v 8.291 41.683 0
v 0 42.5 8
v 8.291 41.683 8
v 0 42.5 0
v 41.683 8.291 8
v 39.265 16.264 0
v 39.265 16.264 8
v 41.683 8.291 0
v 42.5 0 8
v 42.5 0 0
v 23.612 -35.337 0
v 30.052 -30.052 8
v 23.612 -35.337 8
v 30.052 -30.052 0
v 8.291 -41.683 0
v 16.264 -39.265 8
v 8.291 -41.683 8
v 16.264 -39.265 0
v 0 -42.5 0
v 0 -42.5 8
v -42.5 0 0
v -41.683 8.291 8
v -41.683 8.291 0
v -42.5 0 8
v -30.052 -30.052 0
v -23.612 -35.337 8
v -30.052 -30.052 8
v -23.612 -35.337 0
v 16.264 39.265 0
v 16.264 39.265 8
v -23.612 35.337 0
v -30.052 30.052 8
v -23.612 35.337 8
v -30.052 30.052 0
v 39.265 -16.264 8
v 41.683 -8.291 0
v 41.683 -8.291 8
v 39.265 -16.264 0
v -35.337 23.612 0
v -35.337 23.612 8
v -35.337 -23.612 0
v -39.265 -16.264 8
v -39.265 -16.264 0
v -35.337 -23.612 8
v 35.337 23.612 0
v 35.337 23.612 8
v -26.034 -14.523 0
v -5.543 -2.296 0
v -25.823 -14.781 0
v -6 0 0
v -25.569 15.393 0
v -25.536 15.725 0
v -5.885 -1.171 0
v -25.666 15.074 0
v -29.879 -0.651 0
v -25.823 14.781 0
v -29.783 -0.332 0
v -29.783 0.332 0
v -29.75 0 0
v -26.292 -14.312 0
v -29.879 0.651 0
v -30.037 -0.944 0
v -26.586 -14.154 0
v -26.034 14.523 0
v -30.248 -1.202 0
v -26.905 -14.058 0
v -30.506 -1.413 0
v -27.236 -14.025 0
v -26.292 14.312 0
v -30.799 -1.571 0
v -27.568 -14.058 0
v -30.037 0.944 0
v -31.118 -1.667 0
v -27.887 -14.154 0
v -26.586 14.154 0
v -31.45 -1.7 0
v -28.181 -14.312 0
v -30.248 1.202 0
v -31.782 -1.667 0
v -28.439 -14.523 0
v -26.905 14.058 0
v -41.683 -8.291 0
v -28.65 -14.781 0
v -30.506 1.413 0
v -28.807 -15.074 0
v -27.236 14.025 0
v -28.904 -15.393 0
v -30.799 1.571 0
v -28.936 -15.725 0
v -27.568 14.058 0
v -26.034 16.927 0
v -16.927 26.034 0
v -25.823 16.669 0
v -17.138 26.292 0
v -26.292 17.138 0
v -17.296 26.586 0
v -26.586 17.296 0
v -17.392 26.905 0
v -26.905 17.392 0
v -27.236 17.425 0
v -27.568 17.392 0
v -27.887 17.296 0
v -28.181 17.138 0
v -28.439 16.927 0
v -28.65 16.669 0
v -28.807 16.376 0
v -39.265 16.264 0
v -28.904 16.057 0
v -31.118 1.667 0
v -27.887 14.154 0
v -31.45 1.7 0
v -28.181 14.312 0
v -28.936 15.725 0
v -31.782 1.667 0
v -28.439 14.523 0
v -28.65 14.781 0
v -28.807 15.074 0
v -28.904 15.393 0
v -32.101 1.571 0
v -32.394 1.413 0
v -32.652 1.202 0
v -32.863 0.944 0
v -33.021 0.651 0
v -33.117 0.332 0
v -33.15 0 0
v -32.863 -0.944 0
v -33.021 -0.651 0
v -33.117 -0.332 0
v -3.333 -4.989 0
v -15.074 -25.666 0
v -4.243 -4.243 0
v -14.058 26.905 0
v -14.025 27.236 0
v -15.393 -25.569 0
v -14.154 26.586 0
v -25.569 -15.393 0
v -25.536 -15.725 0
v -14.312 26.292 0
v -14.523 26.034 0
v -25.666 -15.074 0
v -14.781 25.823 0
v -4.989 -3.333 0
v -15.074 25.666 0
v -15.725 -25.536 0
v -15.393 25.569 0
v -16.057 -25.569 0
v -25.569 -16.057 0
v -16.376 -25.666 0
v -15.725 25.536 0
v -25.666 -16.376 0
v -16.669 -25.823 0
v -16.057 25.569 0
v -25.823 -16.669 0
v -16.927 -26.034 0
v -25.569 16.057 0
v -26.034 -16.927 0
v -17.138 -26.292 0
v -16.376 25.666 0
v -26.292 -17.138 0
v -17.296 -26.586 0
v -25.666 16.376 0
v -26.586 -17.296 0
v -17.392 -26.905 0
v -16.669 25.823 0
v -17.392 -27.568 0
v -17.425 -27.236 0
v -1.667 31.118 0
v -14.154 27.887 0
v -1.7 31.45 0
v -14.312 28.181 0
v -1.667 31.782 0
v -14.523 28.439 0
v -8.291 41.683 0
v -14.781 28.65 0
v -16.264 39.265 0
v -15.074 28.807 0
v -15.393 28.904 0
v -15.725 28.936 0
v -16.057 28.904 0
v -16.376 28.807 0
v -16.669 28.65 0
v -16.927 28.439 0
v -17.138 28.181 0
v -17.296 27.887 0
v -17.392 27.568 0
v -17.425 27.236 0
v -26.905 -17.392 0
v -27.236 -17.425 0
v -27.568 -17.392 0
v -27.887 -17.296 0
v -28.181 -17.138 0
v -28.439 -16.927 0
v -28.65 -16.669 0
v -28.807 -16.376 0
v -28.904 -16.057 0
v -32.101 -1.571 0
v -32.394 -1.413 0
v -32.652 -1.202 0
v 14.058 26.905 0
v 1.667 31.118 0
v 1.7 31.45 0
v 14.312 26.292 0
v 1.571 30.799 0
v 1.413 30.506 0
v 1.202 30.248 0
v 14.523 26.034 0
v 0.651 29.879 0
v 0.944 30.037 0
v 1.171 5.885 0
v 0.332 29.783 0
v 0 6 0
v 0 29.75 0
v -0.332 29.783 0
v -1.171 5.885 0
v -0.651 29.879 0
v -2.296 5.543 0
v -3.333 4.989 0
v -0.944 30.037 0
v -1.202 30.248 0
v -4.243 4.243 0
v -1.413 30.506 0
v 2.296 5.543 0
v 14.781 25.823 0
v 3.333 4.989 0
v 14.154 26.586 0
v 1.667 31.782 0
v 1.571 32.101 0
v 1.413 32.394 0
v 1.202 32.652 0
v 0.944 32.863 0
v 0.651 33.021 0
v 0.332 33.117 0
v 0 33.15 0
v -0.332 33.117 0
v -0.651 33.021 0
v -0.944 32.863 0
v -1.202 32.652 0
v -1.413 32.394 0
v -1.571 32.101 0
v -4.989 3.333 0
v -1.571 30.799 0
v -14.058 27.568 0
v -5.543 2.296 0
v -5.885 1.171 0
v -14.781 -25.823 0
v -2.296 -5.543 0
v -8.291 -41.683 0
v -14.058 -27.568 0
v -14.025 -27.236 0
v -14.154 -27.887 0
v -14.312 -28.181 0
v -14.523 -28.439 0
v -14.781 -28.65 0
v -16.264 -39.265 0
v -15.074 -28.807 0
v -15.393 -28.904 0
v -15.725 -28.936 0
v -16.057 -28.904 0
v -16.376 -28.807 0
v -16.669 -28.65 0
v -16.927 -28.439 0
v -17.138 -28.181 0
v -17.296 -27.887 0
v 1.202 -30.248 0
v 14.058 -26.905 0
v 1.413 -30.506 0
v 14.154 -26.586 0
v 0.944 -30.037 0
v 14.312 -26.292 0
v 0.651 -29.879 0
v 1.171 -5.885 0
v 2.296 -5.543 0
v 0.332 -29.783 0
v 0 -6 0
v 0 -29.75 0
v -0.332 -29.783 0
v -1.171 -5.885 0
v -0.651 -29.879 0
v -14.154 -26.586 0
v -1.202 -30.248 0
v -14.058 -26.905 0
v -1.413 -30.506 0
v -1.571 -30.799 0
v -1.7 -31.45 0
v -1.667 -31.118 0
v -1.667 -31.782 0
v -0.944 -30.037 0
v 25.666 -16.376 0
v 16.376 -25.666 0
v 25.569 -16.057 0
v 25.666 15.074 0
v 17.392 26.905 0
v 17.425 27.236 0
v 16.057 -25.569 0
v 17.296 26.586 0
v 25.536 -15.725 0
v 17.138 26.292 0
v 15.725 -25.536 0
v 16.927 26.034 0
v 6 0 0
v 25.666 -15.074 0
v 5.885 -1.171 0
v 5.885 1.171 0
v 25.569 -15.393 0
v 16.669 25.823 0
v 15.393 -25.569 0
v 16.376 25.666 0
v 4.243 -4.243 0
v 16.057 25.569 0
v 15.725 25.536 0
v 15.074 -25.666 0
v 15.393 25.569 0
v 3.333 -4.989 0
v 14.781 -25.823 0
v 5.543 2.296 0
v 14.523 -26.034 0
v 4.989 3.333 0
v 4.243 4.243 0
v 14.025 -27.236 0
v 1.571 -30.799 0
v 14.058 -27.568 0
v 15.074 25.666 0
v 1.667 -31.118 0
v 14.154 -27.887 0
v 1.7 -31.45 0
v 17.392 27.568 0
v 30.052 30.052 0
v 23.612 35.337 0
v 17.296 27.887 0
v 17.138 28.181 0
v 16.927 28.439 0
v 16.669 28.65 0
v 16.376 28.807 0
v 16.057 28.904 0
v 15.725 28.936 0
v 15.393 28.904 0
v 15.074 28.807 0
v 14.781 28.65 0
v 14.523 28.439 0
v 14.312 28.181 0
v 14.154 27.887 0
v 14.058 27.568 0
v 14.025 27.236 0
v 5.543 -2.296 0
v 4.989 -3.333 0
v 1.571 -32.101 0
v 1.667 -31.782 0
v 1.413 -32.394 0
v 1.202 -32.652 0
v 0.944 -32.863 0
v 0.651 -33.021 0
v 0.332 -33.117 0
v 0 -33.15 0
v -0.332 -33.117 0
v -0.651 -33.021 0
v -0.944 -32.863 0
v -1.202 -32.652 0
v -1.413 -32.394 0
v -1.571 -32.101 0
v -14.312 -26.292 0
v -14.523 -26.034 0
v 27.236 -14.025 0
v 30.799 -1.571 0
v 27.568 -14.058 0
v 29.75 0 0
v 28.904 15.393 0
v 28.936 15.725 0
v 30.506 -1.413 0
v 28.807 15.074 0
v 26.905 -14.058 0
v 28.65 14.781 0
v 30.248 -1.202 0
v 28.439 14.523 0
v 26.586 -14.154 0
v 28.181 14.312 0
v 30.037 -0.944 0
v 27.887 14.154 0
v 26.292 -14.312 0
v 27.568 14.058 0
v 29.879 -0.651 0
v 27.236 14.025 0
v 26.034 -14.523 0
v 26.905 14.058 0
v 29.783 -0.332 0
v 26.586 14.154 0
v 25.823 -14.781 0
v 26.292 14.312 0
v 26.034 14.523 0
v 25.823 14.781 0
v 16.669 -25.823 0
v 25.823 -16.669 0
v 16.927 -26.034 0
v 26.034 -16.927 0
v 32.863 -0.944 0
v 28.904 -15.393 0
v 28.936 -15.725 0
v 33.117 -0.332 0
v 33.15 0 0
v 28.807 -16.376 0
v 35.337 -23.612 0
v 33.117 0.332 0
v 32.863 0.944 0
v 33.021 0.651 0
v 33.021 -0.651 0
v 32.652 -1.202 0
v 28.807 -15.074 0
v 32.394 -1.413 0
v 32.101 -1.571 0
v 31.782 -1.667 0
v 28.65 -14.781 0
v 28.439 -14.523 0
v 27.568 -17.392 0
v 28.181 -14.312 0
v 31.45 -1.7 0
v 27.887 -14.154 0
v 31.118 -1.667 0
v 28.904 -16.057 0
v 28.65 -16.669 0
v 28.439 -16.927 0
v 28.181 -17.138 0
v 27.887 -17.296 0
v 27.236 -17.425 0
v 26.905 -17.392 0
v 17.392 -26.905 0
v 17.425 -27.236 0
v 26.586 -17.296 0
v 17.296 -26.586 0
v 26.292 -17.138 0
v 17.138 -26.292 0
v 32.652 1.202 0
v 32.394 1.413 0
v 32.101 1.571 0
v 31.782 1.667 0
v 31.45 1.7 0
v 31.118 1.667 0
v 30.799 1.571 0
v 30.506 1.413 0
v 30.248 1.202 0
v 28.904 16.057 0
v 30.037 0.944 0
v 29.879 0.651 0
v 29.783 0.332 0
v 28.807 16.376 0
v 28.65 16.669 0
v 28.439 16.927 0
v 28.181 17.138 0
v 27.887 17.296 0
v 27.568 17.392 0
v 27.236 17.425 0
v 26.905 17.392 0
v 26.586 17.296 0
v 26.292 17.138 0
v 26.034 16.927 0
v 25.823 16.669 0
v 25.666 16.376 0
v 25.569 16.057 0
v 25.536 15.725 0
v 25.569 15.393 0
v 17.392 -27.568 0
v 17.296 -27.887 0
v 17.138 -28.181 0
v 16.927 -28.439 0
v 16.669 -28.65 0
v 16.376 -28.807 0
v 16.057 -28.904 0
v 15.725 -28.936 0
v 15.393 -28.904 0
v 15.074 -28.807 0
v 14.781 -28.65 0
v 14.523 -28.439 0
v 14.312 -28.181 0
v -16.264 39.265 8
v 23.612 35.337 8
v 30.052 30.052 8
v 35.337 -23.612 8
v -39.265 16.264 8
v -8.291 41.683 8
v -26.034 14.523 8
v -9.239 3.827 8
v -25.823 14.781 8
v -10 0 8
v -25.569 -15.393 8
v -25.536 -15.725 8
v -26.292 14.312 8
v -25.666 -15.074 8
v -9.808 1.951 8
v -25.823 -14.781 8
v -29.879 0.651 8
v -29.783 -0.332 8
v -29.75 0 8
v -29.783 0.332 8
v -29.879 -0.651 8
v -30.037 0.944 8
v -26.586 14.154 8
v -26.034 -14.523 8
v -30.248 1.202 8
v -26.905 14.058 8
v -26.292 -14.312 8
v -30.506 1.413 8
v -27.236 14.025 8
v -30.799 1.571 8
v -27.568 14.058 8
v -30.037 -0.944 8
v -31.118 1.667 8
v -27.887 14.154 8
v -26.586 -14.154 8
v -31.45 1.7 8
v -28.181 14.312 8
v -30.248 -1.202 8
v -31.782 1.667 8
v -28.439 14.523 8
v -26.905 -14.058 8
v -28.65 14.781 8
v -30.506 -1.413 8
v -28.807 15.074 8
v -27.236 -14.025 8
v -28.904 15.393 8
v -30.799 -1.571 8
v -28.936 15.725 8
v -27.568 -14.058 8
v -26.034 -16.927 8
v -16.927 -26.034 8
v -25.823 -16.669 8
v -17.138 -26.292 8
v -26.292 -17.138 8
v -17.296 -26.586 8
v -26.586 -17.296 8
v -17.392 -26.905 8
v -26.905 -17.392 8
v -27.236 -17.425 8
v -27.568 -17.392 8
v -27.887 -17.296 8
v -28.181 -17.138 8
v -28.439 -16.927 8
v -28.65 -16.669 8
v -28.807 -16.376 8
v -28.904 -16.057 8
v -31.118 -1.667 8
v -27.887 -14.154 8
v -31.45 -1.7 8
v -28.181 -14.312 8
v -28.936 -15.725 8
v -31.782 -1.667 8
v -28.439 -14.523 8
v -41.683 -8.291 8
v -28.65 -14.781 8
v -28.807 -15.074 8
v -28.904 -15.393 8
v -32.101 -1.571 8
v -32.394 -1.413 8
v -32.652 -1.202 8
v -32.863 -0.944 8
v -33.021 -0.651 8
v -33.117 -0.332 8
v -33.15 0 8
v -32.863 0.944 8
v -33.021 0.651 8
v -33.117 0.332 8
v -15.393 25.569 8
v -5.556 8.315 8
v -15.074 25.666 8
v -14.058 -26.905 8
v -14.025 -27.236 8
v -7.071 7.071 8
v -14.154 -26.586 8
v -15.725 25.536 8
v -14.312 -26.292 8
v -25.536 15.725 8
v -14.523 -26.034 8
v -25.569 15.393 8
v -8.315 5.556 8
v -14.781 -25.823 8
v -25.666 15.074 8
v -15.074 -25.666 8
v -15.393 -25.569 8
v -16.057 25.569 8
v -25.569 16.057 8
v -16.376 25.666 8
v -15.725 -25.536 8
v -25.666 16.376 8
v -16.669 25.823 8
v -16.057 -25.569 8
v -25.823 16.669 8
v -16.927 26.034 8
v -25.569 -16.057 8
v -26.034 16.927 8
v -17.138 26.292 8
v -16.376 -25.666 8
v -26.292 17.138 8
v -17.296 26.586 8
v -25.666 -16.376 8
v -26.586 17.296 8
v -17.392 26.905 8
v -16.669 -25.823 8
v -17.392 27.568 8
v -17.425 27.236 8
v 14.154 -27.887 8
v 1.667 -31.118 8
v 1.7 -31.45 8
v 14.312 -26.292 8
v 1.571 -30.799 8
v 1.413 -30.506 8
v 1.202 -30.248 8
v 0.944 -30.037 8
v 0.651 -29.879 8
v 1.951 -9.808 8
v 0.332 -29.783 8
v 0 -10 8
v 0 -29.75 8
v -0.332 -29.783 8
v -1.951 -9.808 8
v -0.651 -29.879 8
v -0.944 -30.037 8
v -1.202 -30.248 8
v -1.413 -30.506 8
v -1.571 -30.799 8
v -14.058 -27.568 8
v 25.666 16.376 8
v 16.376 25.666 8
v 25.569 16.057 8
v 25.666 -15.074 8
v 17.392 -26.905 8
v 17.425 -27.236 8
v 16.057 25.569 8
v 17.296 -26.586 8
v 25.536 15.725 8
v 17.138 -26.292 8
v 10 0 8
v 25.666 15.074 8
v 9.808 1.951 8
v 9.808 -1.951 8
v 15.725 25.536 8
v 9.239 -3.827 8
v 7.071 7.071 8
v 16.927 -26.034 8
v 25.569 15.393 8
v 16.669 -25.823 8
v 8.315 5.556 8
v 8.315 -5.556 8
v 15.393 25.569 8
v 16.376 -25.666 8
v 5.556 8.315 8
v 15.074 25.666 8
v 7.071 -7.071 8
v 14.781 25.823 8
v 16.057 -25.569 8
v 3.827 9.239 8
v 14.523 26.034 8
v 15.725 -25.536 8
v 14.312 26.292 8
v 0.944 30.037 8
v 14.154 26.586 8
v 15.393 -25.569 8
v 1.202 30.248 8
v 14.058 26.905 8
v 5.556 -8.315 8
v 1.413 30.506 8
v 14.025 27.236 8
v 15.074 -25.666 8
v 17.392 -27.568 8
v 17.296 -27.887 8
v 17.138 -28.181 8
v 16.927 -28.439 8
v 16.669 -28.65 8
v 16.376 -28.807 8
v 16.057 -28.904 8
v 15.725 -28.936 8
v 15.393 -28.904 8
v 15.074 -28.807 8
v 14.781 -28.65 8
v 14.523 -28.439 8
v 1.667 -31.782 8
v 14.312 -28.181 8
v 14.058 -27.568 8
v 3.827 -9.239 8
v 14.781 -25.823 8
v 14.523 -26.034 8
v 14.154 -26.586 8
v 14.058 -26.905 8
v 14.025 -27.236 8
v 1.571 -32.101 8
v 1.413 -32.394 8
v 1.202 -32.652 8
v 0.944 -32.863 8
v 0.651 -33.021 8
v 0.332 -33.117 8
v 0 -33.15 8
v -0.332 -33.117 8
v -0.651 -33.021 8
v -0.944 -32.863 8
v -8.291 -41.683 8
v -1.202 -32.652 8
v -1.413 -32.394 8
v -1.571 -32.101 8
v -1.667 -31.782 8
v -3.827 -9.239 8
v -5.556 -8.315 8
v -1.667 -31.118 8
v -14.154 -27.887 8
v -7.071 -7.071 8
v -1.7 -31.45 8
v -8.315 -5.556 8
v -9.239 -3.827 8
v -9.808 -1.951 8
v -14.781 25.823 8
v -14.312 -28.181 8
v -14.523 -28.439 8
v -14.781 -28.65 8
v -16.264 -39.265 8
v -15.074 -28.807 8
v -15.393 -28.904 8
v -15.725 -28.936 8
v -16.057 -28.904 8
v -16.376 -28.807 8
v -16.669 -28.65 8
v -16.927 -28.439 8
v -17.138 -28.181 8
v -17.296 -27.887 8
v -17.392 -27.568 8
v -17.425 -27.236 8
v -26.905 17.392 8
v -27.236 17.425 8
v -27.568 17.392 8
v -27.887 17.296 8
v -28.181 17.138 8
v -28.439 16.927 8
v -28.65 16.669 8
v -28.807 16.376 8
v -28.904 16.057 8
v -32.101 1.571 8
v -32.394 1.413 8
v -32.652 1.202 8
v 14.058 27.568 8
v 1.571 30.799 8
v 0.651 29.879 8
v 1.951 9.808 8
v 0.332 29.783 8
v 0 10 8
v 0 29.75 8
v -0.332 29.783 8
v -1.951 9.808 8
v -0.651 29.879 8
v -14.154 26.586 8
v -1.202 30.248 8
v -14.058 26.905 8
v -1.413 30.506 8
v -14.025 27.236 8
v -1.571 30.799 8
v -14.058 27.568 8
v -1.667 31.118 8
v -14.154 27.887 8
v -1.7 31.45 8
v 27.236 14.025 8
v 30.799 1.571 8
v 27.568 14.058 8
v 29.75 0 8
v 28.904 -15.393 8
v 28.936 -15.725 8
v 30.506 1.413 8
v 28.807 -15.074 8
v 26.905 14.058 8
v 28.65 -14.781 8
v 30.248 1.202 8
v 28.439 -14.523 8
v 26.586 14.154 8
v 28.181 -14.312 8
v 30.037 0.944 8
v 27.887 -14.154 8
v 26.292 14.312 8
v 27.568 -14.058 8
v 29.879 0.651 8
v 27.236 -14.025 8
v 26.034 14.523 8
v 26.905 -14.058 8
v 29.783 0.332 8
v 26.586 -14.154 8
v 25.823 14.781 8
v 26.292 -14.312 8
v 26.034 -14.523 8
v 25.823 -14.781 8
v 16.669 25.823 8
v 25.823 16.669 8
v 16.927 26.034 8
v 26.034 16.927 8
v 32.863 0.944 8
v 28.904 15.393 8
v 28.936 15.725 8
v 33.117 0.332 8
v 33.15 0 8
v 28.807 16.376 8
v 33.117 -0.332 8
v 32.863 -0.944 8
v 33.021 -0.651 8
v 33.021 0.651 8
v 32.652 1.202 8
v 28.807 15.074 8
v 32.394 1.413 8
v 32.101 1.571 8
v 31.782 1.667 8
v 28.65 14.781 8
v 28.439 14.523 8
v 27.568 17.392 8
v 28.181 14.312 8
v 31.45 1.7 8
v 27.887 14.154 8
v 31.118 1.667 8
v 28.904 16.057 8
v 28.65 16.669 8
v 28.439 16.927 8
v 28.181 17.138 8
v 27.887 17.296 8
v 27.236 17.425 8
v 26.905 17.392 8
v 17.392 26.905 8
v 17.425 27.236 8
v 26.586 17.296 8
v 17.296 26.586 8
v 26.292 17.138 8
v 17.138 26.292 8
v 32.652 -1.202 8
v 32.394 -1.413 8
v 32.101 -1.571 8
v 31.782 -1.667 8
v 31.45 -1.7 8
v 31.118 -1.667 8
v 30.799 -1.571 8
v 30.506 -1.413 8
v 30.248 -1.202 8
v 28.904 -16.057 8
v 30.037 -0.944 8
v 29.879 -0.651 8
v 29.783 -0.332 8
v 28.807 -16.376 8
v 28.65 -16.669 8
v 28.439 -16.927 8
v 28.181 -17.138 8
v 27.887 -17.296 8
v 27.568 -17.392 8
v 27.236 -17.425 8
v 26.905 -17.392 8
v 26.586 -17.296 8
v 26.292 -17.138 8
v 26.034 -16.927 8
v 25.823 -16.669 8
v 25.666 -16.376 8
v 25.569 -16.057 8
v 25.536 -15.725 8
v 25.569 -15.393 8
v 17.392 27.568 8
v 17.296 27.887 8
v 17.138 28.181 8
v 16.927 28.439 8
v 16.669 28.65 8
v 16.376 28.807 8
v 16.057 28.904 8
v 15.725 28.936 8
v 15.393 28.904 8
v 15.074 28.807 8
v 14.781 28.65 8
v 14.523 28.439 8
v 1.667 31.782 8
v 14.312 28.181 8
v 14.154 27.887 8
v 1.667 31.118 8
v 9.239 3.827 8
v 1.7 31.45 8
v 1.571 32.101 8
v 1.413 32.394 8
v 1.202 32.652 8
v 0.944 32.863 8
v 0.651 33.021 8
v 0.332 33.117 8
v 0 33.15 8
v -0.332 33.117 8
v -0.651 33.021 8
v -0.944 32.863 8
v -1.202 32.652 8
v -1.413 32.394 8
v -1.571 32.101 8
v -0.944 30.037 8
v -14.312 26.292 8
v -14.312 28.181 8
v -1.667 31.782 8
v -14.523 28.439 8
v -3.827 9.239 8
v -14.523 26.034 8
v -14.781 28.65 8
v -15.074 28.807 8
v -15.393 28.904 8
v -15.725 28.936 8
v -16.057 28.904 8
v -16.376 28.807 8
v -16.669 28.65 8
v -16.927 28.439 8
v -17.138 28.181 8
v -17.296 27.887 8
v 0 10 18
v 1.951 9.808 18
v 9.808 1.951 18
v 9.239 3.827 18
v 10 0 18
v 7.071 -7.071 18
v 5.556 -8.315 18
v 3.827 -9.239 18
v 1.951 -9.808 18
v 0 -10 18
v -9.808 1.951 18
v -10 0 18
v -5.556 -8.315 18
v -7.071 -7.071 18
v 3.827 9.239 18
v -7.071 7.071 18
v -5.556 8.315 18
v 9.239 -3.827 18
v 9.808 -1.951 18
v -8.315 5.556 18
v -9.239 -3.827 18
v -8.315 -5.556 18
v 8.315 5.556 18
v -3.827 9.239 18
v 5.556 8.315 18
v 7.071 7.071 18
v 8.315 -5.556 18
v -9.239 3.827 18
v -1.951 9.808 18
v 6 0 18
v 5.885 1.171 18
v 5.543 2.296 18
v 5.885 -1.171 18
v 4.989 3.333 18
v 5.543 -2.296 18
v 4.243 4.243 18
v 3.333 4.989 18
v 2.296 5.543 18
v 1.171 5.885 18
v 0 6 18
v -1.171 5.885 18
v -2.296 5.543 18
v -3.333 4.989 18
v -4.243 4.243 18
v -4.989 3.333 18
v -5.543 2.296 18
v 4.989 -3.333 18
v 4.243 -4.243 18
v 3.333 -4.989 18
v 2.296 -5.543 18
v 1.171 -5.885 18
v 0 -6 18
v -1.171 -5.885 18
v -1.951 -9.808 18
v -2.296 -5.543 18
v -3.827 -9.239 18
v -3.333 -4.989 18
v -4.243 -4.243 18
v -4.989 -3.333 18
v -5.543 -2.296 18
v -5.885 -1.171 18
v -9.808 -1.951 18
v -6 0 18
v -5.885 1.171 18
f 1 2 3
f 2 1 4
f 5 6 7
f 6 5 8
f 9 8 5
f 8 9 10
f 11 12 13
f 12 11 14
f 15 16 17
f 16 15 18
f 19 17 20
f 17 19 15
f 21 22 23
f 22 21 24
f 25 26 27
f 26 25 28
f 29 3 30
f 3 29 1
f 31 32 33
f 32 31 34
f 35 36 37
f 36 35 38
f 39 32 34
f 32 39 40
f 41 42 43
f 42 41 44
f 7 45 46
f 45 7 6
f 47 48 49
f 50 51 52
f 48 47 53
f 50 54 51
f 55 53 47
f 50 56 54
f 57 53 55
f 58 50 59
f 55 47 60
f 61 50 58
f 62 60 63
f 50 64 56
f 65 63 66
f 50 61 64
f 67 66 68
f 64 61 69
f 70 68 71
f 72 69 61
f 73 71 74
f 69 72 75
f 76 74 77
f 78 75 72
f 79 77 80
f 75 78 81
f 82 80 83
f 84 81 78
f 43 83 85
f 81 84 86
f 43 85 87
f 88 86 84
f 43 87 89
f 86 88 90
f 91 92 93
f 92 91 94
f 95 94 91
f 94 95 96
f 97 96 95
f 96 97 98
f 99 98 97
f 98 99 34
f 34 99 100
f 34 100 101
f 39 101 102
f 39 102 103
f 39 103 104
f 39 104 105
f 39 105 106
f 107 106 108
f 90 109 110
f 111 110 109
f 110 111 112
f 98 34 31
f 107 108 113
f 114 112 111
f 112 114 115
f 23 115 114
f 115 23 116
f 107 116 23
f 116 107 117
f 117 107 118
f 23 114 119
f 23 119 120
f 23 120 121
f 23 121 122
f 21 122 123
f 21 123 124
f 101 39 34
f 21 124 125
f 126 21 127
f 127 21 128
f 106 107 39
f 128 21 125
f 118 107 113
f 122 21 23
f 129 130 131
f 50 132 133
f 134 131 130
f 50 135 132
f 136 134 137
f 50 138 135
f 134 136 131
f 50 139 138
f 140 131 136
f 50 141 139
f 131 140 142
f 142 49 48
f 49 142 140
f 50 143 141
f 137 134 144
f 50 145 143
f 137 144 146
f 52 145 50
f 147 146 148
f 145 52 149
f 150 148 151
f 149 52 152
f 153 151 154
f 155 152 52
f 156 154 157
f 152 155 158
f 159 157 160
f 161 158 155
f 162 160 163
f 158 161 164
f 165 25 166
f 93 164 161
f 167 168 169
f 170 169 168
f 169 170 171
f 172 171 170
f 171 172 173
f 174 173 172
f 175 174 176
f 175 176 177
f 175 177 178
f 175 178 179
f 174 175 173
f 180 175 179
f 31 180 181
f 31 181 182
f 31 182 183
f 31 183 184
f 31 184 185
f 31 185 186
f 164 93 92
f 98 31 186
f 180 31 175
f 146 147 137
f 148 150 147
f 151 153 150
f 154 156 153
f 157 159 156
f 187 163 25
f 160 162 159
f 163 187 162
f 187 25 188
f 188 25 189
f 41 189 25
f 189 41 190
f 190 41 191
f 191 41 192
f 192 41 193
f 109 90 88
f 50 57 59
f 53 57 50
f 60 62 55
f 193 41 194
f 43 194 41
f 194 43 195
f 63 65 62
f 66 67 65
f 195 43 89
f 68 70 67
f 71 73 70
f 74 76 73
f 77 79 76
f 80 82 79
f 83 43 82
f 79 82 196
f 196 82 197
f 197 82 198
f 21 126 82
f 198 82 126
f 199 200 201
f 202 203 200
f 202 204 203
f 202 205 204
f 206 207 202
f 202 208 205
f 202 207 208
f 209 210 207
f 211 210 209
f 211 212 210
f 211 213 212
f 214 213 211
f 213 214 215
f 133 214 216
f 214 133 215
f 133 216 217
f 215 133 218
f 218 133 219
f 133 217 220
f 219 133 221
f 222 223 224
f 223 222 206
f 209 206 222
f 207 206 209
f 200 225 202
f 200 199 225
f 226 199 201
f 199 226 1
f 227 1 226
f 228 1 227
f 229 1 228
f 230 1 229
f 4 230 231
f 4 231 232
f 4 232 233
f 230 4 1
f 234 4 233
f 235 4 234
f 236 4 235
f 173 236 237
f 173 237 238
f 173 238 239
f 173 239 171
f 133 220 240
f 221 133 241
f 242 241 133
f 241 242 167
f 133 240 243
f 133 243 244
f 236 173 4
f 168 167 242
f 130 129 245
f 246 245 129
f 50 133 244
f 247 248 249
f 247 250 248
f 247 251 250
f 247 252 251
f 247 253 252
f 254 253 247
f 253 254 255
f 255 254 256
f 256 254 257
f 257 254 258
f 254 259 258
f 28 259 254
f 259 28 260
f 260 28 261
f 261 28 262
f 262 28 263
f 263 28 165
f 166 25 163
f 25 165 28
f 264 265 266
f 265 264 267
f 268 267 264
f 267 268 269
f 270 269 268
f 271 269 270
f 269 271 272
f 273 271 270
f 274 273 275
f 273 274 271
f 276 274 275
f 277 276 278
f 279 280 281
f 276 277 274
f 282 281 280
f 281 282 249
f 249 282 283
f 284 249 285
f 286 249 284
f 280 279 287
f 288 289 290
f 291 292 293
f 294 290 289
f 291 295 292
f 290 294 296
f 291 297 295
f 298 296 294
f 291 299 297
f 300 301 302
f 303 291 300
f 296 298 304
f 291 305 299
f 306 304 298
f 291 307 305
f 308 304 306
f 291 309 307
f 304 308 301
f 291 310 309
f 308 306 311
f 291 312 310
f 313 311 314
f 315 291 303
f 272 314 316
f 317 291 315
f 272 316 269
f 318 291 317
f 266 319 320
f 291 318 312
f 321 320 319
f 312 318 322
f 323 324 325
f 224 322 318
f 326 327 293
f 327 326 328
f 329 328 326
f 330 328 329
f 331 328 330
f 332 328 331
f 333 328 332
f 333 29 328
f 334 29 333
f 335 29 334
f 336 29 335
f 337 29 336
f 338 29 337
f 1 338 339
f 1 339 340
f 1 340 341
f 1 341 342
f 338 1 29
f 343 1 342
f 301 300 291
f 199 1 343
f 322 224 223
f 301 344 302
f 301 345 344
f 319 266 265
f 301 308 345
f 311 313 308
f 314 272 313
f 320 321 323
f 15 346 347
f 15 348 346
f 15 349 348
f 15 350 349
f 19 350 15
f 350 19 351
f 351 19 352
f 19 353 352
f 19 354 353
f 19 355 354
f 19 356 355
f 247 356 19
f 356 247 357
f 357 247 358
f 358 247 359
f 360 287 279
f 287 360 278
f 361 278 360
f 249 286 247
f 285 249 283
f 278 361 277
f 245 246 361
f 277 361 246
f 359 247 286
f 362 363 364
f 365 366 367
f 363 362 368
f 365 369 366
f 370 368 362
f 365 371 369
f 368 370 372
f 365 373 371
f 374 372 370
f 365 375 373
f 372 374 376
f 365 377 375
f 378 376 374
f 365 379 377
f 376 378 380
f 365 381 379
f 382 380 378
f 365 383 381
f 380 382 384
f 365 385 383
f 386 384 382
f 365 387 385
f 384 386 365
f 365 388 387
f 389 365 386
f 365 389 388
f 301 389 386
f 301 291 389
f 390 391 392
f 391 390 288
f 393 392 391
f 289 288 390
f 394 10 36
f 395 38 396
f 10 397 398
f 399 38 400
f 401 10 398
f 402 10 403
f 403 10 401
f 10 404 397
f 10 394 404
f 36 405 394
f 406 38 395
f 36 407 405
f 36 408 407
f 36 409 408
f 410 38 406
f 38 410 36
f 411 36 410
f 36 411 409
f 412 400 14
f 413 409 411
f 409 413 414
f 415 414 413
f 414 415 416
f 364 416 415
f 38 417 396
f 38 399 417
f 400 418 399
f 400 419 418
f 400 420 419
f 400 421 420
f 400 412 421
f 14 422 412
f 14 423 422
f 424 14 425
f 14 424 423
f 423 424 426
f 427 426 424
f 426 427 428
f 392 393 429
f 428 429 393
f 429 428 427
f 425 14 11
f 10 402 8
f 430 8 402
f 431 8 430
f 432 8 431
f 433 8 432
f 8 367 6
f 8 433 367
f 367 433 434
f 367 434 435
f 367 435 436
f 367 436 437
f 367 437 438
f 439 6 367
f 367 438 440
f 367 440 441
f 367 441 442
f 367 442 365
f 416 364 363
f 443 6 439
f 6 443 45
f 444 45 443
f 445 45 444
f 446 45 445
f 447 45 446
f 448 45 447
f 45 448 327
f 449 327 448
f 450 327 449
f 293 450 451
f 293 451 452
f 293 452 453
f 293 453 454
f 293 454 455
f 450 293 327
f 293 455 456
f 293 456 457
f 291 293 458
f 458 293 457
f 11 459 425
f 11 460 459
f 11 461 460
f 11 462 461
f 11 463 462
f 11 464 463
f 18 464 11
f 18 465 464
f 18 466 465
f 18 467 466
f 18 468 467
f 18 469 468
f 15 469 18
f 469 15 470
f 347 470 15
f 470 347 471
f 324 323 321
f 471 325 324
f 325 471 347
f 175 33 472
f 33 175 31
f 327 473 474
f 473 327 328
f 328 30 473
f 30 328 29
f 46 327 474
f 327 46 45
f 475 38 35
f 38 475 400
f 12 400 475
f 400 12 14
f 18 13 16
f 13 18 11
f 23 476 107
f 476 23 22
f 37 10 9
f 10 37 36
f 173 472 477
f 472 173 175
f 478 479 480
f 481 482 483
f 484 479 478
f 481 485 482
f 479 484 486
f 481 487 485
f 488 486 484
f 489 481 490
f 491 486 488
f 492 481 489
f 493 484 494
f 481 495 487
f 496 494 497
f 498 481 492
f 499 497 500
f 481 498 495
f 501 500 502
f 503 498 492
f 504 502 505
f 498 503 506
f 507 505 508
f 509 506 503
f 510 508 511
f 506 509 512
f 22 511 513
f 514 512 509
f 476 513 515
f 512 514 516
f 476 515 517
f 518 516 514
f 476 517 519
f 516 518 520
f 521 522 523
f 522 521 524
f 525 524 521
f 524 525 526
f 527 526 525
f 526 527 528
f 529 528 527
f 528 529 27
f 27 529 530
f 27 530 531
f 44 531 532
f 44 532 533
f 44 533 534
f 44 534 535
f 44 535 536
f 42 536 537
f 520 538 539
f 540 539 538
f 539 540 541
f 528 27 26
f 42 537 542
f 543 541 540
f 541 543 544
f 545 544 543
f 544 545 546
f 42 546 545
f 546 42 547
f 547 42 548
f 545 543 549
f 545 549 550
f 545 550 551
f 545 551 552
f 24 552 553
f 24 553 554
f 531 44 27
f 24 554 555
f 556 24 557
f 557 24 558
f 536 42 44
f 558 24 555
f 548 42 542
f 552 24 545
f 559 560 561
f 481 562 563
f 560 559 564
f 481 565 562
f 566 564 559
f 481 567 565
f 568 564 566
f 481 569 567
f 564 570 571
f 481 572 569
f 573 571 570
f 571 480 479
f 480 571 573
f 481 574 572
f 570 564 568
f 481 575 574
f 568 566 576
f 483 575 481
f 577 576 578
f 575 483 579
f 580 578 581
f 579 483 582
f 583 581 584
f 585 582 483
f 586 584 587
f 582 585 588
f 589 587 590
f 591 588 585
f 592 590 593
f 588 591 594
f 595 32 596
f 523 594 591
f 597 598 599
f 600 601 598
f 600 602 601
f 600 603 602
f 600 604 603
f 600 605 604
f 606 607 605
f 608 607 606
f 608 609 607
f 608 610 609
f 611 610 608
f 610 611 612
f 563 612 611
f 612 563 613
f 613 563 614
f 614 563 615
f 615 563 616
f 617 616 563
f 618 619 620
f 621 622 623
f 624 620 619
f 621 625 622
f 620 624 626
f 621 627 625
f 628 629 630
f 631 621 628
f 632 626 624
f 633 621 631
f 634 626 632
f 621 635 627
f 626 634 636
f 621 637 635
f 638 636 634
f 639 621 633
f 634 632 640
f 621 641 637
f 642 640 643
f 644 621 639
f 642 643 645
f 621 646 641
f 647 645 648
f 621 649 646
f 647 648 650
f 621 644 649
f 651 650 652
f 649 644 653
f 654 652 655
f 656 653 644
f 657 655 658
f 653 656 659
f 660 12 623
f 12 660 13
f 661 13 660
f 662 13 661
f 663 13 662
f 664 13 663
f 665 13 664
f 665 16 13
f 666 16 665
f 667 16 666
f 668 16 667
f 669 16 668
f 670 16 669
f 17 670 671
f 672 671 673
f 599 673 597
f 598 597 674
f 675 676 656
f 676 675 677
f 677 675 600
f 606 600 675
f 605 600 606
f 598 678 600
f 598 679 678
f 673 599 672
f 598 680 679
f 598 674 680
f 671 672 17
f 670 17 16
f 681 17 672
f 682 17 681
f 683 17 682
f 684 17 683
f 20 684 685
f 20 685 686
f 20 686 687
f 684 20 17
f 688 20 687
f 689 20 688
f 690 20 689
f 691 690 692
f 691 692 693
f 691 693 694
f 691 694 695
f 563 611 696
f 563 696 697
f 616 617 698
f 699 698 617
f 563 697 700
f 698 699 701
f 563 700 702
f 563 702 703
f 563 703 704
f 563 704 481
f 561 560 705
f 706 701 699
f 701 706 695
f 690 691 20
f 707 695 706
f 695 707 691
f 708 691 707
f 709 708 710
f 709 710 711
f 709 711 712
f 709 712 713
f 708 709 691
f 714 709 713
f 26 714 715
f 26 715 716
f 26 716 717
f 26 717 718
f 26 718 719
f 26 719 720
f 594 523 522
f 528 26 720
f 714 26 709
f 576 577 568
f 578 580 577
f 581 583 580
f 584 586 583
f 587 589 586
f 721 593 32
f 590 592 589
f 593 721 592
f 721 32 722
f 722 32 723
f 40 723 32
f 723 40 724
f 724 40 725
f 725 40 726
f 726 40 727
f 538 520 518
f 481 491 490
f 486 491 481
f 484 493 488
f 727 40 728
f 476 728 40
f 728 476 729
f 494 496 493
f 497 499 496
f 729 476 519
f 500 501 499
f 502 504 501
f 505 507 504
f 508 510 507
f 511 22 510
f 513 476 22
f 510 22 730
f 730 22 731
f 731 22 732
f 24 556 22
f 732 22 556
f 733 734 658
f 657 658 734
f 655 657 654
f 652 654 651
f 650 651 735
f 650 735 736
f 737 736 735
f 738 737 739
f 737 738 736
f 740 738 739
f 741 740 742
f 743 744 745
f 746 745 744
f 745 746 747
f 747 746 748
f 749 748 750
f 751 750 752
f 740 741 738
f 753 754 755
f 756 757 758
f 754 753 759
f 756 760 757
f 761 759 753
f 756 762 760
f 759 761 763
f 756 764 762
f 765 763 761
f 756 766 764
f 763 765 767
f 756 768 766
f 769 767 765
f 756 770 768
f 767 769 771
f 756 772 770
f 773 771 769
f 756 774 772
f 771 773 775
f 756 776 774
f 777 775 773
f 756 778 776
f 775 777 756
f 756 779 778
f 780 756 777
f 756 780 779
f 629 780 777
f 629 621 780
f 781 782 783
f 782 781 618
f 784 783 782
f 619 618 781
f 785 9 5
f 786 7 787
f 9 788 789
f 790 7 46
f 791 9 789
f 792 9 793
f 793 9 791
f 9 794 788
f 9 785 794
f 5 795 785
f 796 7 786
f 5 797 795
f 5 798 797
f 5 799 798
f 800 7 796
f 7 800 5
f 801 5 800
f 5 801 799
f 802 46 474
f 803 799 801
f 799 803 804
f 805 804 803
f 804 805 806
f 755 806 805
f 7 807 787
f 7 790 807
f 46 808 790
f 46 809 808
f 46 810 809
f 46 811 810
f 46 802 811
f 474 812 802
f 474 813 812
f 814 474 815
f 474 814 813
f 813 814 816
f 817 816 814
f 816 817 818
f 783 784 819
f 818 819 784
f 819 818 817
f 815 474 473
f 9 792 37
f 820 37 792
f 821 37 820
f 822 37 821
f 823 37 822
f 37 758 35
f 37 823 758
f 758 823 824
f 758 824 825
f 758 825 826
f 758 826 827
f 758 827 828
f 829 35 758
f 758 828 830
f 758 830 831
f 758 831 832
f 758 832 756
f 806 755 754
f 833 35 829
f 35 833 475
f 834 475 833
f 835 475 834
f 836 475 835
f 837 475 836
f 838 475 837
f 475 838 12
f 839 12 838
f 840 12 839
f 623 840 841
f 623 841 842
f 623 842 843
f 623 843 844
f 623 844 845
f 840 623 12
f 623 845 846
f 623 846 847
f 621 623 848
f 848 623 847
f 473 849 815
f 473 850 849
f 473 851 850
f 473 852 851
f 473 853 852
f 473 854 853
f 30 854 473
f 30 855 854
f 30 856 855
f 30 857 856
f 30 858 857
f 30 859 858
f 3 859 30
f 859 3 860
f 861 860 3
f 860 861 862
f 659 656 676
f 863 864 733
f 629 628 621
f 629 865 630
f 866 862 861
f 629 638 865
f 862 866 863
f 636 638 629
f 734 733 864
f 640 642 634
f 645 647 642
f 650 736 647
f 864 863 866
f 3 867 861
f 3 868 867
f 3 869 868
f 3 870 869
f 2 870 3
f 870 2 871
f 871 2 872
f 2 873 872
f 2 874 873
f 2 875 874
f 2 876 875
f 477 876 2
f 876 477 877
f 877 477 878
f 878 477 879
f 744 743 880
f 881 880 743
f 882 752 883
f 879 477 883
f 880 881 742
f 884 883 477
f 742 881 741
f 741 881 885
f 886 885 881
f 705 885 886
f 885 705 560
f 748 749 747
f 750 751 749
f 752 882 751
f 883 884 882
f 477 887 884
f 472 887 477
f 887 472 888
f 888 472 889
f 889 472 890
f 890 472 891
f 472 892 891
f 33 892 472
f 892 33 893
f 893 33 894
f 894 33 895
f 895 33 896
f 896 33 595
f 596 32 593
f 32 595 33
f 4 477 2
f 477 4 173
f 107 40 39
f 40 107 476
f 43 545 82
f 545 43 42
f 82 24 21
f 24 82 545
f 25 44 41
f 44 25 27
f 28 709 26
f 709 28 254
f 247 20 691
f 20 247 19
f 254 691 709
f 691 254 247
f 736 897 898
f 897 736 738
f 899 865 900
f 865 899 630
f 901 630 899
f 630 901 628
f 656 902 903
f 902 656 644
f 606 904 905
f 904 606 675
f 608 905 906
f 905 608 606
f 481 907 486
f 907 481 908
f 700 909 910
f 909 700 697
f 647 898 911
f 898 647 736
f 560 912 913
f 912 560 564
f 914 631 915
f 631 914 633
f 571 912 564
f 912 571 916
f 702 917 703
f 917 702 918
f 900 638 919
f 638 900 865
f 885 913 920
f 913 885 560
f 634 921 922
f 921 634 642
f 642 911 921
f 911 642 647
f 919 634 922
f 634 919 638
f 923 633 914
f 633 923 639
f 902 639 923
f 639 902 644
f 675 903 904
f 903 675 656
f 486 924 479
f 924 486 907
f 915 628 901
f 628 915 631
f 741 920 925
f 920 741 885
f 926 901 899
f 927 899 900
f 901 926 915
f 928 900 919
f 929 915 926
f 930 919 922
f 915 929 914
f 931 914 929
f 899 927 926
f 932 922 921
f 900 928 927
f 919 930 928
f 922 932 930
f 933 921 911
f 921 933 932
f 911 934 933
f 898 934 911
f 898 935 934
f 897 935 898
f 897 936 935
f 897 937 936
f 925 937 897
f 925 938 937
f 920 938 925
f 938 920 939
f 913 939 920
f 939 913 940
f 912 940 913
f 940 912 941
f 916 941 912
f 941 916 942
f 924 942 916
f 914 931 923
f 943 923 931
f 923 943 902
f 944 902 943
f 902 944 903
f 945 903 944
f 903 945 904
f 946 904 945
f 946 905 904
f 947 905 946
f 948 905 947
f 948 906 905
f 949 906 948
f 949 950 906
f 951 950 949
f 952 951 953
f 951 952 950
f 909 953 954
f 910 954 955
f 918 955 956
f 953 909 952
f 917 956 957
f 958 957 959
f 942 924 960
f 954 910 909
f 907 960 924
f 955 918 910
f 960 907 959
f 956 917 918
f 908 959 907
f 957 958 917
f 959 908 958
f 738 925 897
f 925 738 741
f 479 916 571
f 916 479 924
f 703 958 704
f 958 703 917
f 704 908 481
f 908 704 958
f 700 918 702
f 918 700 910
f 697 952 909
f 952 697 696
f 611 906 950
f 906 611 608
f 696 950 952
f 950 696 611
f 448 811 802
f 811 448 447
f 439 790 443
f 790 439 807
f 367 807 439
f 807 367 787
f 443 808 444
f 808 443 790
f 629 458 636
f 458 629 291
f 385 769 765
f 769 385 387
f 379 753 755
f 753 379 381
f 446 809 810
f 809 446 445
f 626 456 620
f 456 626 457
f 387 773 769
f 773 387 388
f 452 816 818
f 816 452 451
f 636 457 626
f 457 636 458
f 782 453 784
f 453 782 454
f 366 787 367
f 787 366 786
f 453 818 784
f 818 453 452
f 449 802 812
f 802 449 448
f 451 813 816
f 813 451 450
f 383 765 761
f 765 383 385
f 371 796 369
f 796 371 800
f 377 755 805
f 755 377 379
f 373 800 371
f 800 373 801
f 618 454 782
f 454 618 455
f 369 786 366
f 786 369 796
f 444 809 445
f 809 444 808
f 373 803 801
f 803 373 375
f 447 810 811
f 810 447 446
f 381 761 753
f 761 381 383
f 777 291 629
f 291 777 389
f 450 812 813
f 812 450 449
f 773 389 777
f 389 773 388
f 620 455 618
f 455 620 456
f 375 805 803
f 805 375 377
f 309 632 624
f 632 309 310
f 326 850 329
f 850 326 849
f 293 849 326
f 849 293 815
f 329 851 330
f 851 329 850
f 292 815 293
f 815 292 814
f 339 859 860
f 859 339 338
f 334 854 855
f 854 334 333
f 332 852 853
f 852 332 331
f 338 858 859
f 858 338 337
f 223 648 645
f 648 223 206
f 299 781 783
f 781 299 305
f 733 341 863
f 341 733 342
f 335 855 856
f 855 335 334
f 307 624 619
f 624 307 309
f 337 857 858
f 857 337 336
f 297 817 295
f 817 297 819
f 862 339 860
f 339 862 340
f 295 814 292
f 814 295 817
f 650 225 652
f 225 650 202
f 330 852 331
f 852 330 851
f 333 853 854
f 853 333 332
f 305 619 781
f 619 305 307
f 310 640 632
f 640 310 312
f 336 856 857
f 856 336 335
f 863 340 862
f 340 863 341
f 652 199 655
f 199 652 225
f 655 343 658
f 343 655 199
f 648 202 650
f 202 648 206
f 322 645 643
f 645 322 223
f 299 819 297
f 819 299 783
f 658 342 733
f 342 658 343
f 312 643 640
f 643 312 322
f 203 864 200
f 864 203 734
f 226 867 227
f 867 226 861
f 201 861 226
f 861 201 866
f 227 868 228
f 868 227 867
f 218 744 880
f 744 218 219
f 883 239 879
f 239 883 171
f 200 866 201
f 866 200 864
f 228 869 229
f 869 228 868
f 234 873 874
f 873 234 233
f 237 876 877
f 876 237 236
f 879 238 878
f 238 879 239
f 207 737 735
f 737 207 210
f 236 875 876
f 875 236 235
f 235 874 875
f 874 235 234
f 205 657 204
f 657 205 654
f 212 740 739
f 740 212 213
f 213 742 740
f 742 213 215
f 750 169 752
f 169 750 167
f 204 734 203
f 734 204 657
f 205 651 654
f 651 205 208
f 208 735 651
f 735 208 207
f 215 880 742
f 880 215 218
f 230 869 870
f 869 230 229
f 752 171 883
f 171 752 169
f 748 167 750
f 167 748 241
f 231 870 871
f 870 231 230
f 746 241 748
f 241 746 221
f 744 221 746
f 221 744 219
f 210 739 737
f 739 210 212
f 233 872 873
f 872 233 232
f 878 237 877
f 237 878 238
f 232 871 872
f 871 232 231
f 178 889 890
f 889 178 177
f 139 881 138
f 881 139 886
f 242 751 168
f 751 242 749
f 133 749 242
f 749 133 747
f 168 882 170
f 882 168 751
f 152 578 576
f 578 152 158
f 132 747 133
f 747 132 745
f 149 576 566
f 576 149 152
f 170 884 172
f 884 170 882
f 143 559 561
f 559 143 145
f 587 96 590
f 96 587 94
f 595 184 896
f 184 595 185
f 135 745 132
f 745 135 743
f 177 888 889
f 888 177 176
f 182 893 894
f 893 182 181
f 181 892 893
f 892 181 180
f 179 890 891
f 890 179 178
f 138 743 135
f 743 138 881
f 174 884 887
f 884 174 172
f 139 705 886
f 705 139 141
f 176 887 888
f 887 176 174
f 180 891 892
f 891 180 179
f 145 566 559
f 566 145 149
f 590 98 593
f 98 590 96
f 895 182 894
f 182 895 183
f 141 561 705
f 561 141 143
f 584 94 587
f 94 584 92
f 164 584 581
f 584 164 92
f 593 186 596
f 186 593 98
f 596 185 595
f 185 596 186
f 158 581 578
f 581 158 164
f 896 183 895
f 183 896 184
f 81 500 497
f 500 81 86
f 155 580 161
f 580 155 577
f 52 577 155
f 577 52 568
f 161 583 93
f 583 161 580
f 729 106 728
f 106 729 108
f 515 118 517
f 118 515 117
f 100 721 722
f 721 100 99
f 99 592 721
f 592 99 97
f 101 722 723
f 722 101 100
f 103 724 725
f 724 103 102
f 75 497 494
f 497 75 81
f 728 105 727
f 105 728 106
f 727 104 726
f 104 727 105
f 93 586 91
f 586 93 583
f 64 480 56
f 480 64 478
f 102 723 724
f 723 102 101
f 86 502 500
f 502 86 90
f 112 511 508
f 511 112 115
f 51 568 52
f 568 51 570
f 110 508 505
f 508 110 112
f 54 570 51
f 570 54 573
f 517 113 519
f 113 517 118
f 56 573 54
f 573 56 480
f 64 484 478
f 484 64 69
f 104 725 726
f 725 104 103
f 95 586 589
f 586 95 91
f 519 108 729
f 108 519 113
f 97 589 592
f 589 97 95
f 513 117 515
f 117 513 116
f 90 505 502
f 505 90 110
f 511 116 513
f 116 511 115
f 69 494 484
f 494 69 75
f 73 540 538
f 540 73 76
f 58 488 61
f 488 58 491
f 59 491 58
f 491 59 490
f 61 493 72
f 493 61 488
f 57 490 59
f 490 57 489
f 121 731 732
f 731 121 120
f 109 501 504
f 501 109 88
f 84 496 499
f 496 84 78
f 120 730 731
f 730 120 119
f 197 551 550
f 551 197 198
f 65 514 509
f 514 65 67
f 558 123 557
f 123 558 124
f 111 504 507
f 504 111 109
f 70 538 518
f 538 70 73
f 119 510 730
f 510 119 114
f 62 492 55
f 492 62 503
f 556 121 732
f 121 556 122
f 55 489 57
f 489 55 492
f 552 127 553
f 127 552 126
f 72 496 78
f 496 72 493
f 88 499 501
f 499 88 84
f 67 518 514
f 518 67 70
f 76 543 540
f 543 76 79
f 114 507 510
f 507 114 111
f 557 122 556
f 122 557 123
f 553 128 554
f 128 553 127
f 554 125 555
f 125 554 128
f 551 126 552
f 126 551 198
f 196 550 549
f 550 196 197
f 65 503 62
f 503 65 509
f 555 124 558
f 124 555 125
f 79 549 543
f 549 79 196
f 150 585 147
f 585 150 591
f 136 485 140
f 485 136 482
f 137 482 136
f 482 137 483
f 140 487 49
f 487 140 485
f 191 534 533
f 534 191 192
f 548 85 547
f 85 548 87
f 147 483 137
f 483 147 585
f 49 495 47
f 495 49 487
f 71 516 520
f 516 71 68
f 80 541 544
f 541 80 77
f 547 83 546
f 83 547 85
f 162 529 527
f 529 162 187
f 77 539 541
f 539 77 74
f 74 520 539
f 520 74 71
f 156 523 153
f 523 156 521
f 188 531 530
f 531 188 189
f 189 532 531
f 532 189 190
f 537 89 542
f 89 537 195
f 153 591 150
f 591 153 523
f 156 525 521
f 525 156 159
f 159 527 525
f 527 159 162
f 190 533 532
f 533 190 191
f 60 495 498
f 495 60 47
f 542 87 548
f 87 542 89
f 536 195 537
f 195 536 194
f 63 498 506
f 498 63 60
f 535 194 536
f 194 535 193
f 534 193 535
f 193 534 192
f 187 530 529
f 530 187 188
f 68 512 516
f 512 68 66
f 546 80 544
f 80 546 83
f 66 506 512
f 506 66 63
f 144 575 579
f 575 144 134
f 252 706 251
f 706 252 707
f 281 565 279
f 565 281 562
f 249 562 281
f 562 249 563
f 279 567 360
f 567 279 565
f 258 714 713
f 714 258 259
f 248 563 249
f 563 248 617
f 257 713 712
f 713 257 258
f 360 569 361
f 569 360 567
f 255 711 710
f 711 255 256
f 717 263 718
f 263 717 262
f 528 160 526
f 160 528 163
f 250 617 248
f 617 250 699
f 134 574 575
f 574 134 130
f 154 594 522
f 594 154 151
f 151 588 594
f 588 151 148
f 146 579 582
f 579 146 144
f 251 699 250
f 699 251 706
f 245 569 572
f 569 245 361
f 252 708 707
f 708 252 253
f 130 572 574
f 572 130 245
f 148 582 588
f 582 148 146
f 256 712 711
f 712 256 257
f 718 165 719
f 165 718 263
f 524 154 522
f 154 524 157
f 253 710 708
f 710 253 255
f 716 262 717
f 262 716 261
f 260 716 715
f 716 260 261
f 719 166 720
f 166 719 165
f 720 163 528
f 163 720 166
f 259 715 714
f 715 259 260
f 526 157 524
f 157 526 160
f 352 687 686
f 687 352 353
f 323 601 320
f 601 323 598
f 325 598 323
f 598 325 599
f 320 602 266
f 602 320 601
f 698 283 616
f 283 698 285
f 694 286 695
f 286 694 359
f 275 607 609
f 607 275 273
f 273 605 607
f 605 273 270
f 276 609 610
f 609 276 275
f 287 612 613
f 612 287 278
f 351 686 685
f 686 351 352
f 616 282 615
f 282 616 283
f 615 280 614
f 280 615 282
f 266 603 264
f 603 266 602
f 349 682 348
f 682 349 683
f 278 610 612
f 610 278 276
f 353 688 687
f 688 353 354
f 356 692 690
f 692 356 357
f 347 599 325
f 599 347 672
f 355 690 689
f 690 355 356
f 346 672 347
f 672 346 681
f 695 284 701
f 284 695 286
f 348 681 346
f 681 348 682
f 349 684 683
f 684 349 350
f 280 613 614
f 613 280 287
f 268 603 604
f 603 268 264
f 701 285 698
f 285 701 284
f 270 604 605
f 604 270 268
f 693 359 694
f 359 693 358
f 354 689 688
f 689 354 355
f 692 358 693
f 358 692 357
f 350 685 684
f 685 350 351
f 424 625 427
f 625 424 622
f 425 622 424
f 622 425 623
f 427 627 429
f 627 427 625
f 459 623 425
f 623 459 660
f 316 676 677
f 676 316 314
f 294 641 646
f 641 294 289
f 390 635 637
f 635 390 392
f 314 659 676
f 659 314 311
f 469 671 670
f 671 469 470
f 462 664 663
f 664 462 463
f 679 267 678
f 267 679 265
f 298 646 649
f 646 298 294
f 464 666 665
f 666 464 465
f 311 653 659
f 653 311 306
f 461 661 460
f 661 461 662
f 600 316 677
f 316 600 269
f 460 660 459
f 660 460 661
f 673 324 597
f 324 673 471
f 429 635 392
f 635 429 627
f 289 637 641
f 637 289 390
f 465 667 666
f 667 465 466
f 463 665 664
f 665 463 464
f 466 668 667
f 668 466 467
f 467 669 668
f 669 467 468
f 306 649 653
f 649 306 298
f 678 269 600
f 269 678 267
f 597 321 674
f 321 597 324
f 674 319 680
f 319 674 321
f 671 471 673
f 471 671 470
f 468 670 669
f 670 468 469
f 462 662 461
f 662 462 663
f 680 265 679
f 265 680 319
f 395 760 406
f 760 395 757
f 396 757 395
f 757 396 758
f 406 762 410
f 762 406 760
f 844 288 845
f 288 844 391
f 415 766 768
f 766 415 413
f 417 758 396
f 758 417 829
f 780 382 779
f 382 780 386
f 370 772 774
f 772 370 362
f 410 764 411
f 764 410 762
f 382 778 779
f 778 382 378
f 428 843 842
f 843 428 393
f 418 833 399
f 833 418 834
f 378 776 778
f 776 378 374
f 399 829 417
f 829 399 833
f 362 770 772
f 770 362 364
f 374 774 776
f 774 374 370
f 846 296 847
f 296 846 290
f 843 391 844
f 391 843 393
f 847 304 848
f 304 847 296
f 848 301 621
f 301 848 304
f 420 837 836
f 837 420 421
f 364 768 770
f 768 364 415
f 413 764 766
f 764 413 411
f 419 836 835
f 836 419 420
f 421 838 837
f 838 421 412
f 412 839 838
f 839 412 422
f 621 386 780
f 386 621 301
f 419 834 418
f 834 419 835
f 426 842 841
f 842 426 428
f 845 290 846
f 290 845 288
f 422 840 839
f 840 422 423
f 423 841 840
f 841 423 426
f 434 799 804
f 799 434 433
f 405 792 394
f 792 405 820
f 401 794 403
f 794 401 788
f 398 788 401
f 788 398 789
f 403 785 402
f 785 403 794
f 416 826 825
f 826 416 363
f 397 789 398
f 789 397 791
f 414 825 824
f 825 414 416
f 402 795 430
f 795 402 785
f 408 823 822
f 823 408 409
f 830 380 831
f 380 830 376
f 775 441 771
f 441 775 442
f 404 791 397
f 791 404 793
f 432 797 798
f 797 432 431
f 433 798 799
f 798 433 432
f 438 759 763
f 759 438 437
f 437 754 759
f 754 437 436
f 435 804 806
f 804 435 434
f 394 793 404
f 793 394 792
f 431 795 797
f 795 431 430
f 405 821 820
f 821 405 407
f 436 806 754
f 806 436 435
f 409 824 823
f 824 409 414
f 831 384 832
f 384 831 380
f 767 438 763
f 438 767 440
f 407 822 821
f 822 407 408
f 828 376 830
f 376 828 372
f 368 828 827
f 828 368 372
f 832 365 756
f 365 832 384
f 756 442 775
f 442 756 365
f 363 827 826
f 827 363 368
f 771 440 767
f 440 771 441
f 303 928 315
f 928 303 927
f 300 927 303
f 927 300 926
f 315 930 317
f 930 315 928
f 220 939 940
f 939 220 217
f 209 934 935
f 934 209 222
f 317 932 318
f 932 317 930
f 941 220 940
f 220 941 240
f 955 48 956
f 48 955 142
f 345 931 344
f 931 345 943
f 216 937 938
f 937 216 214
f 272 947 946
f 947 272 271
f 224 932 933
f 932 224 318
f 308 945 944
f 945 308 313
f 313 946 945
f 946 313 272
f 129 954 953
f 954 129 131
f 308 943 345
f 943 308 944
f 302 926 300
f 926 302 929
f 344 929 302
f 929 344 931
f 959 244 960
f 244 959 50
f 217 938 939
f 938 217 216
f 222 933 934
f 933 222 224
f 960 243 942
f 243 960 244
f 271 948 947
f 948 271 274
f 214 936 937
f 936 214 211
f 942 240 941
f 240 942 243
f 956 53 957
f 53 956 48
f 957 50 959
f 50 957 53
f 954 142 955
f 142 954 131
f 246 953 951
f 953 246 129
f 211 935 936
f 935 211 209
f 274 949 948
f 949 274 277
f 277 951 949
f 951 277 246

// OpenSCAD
$fn = 32;

// ----------------------------------------------------------------------
// Flange Ø85 x 8
// 12 holes on a Ø62.9 bolt circle, bolted joints
// ----------------------------------------------------------------------

// --- parameters (mm) ---
flange_d = 85;   // outside diameter of the flange
thickness = 8;   // flange thickness
holes = 12;      // number of bolt holes
pcd = 62.9;      // bolt circle diameter
start_deg = 30;  // angle of the first hole, from +X
hole_d = 3.4;    // bolt hole diameter
bore_d = 12;     // central through bore
hub_d = 20;      // hub outside diameter
hub_h = 10;      // hub height above the flange face (0 = no hub)

// --- derived feature positions (mm) ---
height = thickness + hub_h;  // = 18   overall height of the part
pcd_r = pcd / 2;             // = 31.45   bolt circle radius
hole_step = 360 / holes;     // = 30   angular pitch
feature_centers = [
  [pcd_r * cos(start_deg + 0 * hole_step), pcd_r * sin(start_deg + 0 * hole_step)],
  [pcd_r * cos(start_deg + 1 * hole_step), pcd_r * sin(start_deg + 1 * hole_step)],
  [pcd_r * cos(start_deg + 2 * hole_step), pcd_r * sin(start_deg + 2 * hole_step)],
  [pcd_r * cos(start_deg + 3 * hole_step), pcd_r * sin(start_deg + 3 * hole_step)],
  [pcd_r * cos(start_deg + 4 * hole_step), pcd_r * sin(start_deg + 4 * hole_step)],
  [pcd_r * cos(start_deg + 5 * hole_step), pcd_r * sin(start_deg + 5 * hole_step)],
  [pcd_r * cos(start_deg + 6 * hole_step), pcd_r * sin(start_deg + 6 * hole_step)],
  [pcd_r * cos(start_deg + 7 * hole_step), pcd_r * sin(start_deg + 7 * hole_step)],
  [pcd_r * cos(start_deg + 8 * hole_step), pcd_r * sin(start_deg + 8 * hole_step)],
  [pcd_r * cos(start_deg + 9 * hole_step), pcd_r * sin(start_deg + 9 * hole_step)],
  [pcd_r * cos(start_deg + 10 * hole_step), pcd_r * sin(start_deg + 10 * hole_step)],
  [pcd_r * cos(start_deg + 11 * hole_step), pcd_r * sin(start_deg + 11 * hole_step)]
];   // bolt hole centres on the pitch circle

// flange disc, every hole and the bore cut straight through
difference() {
  union() {
    cylinder(d = flange_d, h = thickness);
    cylinder(d = hub_d, h = height);  // hub, overlapped into the flange
  }
  translate([0, 0, -1]) cylinder(d = bore_d, h = height + 2);  // bore, through
  for (centre = feature_centers)
    translate([centre[0], centre[1], -1]) cylinder(d = hole_d, h = thickness + 2);
}
